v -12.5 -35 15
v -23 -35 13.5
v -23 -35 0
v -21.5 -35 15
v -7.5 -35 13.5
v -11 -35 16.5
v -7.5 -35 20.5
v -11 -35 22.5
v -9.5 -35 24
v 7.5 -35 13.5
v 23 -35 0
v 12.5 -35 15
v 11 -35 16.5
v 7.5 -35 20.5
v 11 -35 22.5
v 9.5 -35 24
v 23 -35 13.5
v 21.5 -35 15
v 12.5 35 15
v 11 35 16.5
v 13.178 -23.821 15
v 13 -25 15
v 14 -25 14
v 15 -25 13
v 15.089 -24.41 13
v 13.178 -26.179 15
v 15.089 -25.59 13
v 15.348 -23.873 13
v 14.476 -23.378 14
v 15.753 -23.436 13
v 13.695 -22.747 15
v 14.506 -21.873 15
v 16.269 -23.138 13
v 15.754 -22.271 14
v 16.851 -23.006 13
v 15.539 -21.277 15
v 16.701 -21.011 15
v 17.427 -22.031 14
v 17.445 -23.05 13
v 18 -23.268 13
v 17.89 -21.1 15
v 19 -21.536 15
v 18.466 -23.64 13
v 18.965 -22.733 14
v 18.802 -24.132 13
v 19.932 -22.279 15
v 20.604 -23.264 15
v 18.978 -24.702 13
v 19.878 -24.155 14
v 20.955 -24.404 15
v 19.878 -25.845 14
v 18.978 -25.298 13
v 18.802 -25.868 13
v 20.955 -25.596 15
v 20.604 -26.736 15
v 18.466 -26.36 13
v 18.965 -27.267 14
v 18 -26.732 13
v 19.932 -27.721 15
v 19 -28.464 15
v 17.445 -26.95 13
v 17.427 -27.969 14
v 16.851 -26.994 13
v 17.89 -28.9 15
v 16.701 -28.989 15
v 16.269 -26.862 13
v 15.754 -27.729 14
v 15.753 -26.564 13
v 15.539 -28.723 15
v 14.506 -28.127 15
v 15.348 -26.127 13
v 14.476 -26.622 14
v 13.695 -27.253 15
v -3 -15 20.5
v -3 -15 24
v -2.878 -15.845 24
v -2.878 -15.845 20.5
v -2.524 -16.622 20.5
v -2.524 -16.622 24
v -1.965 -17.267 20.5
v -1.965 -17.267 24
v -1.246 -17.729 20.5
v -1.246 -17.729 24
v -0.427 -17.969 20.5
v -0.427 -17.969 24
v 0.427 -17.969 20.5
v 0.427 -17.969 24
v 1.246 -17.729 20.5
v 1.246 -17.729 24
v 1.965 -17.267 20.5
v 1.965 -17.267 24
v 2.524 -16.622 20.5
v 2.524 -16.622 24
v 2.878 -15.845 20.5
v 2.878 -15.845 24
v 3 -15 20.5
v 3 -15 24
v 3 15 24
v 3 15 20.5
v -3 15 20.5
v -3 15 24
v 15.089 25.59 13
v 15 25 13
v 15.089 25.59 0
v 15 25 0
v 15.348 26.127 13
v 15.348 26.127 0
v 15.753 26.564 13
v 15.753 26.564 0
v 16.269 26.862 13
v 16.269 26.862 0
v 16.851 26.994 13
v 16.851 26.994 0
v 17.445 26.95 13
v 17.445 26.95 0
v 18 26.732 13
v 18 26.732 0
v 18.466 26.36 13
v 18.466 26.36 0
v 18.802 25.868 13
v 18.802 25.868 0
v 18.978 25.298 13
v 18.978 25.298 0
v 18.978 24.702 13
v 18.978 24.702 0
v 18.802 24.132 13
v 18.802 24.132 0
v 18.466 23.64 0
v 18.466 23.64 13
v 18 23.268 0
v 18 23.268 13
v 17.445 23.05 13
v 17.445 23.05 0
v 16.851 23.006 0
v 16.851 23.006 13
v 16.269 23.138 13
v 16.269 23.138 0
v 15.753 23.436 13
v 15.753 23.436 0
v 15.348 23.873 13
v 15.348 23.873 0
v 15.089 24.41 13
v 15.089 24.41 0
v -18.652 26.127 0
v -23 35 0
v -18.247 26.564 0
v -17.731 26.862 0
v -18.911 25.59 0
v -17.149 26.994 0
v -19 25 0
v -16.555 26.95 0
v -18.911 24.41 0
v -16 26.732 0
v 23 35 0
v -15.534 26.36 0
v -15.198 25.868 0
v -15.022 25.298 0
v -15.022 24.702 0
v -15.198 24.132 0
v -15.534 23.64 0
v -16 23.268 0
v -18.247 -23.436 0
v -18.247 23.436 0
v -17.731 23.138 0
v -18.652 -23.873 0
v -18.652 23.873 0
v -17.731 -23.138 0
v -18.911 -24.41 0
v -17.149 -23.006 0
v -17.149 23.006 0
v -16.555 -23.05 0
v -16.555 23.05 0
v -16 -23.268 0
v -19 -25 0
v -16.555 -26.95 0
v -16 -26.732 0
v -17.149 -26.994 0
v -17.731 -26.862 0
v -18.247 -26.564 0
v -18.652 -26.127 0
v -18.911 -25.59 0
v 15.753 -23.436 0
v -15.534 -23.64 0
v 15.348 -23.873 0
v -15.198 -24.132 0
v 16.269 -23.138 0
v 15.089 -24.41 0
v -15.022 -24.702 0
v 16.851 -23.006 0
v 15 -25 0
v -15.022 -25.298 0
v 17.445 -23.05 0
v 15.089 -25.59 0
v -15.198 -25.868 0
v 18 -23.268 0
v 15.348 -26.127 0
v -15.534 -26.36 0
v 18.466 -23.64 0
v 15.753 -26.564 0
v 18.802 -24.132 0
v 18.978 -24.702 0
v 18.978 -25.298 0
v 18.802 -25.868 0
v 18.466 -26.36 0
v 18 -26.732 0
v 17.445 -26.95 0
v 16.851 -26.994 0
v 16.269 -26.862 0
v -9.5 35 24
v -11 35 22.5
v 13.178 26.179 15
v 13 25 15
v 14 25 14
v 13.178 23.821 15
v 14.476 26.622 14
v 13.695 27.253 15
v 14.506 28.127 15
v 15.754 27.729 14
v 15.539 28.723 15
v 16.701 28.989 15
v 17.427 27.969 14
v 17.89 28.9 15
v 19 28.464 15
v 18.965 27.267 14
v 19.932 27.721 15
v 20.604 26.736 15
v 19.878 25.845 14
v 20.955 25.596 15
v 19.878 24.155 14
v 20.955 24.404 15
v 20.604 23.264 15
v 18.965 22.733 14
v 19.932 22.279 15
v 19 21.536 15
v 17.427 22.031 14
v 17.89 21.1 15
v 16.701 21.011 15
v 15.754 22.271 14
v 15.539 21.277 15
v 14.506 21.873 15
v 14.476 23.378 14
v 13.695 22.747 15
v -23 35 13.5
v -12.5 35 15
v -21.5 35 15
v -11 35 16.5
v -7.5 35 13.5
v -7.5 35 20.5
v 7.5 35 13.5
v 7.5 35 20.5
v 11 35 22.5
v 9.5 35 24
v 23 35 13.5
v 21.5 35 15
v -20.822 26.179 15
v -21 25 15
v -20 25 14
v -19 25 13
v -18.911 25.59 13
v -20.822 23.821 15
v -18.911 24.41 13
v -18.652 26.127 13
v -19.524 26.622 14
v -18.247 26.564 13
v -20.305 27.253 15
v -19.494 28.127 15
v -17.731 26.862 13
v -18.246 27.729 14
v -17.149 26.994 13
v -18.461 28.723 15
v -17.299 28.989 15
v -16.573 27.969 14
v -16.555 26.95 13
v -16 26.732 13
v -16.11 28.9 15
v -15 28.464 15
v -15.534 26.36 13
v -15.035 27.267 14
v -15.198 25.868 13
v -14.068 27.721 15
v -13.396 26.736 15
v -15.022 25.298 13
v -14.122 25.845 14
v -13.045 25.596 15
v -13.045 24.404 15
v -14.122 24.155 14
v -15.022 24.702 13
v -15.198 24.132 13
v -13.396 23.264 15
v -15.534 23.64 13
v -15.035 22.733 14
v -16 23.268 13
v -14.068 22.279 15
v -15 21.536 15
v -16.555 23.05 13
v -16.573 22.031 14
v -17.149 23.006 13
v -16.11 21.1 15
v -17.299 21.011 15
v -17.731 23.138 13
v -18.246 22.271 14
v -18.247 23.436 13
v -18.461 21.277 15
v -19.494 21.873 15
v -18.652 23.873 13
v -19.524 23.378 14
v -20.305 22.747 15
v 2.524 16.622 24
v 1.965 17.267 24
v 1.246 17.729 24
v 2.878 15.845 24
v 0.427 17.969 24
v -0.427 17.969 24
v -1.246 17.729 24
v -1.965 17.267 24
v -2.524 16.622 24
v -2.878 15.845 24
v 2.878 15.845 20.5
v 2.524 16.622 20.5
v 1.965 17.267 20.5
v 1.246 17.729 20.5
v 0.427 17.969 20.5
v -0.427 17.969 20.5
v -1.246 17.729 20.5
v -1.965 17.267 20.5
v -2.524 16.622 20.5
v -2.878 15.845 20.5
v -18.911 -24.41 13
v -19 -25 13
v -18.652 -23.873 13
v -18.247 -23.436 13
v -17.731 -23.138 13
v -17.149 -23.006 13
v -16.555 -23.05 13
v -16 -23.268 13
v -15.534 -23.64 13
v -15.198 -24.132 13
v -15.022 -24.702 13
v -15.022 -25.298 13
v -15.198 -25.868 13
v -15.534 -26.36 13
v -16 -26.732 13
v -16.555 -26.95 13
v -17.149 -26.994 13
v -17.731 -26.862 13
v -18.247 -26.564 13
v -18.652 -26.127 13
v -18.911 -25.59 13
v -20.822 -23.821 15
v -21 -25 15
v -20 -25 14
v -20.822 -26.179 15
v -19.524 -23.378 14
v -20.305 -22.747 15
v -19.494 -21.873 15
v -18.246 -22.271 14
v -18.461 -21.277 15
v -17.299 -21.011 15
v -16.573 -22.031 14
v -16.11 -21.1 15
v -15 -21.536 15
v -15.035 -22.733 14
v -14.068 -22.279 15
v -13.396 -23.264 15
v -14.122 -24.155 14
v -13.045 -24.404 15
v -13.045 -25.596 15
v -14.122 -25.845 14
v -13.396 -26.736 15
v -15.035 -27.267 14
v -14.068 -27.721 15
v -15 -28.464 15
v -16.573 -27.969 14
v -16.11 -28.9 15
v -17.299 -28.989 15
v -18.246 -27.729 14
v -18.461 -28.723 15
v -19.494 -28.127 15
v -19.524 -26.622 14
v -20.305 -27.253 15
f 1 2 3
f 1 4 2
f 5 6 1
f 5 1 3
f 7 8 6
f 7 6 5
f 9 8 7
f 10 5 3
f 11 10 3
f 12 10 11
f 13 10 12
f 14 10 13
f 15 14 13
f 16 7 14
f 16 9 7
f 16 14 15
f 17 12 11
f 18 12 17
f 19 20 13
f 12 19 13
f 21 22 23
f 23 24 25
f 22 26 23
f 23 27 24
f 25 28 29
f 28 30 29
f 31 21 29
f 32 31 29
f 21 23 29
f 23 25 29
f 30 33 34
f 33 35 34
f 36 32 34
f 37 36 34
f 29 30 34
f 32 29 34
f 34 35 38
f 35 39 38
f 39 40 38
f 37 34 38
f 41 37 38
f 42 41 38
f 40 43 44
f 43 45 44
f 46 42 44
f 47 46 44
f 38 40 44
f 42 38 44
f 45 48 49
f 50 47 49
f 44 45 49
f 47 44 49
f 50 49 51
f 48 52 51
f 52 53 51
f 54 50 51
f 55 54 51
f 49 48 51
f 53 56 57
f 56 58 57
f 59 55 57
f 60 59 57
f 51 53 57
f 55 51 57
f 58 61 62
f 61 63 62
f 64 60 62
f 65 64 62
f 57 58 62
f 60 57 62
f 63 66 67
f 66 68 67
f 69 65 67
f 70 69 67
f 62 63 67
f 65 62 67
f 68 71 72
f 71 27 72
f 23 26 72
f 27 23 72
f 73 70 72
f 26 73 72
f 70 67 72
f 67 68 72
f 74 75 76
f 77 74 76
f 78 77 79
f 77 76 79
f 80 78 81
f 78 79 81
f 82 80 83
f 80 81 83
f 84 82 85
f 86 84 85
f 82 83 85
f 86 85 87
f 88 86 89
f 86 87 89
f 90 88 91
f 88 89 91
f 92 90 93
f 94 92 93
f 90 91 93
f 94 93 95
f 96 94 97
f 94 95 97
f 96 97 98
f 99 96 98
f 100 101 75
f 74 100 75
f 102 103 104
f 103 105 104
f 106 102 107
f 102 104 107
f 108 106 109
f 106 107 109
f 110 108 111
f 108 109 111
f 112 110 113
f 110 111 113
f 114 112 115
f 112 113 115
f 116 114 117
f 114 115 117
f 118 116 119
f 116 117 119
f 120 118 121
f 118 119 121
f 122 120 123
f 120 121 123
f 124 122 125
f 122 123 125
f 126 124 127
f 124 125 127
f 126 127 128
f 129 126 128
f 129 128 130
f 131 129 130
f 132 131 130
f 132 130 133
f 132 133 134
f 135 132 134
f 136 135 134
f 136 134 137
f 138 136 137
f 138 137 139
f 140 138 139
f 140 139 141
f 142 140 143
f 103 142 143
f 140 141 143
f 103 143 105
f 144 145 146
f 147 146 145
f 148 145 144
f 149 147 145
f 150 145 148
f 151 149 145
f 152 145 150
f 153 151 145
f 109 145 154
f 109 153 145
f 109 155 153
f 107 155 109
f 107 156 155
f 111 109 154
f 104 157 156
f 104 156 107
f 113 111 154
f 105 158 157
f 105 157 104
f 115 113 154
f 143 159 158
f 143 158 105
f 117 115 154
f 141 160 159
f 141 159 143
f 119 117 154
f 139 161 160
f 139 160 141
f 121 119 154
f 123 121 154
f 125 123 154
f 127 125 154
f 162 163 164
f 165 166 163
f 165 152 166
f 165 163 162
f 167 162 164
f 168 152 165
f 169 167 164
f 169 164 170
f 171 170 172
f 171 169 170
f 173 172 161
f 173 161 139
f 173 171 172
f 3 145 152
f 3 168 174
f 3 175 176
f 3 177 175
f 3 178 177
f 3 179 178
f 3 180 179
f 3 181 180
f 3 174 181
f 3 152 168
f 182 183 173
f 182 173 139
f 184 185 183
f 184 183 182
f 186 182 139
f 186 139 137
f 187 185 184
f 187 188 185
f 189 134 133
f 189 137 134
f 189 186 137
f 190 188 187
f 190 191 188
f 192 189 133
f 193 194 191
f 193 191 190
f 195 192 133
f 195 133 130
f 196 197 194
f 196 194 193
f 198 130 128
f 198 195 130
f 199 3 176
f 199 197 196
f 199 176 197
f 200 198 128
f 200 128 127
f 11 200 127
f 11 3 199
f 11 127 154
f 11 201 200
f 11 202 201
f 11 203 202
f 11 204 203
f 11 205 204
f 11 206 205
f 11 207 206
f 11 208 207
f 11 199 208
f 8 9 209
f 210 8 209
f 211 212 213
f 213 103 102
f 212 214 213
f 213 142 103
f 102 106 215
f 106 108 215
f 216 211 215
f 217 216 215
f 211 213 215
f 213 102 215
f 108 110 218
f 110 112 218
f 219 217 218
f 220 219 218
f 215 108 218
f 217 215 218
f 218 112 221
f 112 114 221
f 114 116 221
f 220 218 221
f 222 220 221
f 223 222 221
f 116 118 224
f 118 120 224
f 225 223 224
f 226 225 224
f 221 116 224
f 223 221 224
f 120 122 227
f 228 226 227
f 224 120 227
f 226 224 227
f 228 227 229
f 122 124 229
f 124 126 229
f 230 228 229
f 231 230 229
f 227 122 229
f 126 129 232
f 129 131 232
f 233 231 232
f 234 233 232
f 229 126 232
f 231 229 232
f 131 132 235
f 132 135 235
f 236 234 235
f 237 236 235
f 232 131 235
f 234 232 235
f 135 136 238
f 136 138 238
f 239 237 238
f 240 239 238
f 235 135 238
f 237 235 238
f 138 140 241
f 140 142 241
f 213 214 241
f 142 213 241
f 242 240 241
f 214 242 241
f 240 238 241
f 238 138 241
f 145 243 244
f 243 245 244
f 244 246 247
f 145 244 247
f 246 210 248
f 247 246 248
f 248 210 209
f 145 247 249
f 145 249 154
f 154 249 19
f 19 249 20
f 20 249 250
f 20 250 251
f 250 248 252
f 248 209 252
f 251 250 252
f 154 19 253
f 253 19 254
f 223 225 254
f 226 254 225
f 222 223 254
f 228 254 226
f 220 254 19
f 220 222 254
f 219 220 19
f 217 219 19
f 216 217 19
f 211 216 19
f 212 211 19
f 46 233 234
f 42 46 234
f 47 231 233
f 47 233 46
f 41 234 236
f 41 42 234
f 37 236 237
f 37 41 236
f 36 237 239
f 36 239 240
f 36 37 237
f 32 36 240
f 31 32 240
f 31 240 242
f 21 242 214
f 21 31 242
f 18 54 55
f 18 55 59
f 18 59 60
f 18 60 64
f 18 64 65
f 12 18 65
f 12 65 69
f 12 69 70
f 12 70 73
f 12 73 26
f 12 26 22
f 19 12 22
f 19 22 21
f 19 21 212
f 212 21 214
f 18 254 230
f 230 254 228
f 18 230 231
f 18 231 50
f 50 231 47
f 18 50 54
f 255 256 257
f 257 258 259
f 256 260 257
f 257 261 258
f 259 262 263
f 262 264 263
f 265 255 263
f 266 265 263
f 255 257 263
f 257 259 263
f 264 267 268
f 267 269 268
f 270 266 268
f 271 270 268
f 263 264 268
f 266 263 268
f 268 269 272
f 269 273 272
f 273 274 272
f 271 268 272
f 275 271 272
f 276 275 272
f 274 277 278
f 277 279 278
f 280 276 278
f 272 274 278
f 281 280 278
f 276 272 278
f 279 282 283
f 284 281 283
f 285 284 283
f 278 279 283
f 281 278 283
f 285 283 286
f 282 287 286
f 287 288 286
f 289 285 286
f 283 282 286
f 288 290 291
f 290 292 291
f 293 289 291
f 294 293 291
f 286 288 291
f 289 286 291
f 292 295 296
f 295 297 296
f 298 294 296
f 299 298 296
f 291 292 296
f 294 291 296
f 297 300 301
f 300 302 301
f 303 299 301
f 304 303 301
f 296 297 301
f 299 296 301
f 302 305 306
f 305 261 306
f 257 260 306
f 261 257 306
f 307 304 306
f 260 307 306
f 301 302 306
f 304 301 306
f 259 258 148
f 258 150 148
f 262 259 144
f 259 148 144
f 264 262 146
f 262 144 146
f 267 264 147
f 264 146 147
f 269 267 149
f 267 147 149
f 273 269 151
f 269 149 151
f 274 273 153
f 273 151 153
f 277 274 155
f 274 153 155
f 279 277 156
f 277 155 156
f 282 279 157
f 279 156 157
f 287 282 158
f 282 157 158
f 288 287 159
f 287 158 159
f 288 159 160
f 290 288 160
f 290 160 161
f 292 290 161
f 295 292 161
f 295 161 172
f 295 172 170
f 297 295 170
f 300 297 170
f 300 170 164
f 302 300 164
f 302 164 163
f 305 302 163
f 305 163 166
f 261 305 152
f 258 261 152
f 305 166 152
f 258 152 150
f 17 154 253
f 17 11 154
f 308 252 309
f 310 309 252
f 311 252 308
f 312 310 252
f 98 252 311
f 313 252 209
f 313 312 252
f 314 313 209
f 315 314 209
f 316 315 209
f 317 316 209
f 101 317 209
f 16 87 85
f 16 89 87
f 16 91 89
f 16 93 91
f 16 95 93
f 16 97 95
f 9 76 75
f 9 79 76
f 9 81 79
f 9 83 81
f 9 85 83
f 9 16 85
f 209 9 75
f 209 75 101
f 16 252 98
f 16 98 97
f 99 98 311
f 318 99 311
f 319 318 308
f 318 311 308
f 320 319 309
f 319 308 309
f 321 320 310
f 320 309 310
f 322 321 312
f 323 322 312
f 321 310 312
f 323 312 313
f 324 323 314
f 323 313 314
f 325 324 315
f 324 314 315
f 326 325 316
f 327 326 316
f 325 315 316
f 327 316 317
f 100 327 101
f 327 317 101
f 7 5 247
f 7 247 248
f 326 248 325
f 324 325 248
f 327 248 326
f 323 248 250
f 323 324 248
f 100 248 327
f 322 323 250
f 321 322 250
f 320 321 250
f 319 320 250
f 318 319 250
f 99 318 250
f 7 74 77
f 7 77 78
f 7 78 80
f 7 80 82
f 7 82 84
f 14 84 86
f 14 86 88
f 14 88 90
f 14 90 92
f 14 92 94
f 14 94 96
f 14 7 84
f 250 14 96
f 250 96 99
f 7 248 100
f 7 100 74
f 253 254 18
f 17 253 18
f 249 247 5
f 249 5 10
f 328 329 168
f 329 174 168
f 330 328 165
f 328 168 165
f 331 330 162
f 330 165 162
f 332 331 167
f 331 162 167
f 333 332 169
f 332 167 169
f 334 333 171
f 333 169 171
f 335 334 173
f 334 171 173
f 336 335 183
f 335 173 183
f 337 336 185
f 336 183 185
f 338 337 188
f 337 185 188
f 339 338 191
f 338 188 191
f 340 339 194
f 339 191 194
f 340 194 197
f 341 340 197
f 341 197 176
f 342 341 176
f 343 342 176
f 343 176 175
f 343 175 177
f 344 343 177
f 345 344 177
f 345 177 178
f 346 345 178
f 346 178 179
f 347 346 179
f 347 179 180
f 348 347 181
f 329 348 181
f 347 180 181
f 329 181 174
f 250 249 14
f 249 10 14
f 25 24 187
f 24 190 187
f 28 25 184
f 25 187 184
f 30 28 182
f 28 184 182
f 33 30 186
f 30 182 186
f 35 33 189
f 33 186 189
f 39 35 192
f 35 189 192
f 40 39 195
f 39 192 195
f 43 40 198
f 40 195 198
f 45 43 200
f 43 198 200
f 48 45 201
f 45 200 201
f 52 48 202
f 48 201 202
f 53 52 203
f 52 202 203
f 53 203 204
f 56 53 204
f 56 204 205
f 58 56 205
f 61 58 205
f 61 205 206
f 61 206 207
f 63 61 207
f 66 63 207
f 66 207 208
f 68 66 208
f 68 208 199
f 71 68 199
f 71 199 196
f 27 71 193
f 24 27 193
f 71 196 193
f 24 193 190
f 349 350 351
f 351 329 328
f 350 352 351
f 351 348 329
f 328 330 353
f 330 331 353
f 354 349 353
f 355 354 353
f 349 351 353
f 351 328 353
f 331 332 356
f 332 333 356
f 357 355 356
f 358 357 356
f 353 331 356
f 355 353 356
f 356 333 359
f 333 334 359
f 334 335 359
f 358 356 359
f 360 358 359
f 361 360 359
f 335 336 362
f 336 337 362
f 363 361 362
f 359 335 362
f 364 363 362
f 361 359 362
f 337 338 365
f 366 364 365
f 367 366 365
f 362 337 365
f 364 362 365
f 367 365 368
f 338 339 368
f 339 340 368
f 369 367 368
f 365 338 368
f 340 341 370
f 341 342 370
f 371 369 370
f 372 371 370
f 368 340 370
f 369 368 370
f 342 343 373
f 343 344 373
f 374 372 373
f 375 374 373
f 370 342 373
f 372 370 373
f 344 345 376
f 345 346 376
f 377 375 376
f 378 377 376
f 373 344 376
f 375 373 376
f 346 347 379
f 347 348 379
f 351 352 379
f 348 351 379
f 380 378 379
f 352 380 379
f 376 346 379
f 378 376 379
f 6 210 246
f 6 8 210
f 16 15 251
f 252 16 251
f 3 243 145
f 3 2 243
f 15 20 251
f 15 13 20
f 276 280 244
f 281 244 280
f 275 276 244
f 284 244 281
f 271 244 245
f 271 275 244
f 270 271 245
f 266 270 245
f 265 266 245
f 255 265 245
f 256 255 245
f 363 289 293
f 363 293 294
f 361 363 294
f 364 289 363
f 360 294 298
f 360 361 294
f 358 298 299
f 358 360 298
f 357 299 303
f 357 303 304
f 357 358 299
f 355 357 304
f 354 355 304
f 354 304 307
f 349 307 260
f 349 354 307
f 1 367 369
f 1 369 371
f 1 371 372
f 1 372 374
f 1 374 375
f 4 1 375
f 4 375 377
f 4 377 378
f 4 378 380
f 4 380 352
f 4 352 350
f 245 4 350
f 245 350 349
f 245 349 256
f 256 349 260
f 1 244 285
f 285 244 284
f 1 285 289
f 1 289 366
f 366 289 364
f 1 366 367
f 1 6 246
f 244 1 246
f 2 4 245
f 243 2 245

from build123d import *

# Parameters (mm, degrees)
F0_W           = 15
F0_H           = 7
F1_DEPTH       = 35
F3_DEPTH       = 3.5
F4_SIZE        = 1.5
F6_D           = 4
F6_CSINK_D     = 8
F6_CSINK_ANGLE = 90


with BuildPart() as f1:
    # F0 (on Front) → F1 (new body, symmetric)
    with BuildSketch(Plane.XZ):
        Polygon((-23, 15), (-23, 0), (23, 0), (23, 15), (11, 15), (11, 24), (-11, 24), (-11, 15), align=None)
        with Locations((0, 17)):
            Rectangle(F0_W, F0_H, mode=Mode.SUBTRACT)
    extrude(amount=F1_DEPTH, both=True)

    # F2 (on face) → F3 (cut, through all)
    with BuildSketch(Plane.XY.offset(24)):
        with BuildLine():
            ThreePointArc((3, 15), (0, 18), (-3, 15))
            Line((-3, 15), (-3, -15))
            ThreePointArc((-3, -15), (0, -18), (3, -15))
            Line((3, -15), (3, 15))
        make_face()
    extrude(amount=-F3_DEPTH, mode=Mode.SUBTRACT)

    # F4
    f4_edges = [f1.edges().sort_by_distance(p)[0] for p in [
        (-11, 0, 15),
        (11, 0, 24),
        (-11, 0, 24),
        (11, 0, 15),
        (-23, 0, 15),
        (23, 0, 15),
    ]]
    chamfer(f4_edges, length=F4_SIZE)

    # F6 (through all)
    with Locations(Plane.XY.offset(15)):
        with Locations((17, 25), (17, -25), (-17, -25), (-17, 25)):
            CounterSinkHole(F6_D / 2, F6_CSINK_D / 2, counter_sink_angle=F6_CSINK_ANGLE)


solid = f1.part
